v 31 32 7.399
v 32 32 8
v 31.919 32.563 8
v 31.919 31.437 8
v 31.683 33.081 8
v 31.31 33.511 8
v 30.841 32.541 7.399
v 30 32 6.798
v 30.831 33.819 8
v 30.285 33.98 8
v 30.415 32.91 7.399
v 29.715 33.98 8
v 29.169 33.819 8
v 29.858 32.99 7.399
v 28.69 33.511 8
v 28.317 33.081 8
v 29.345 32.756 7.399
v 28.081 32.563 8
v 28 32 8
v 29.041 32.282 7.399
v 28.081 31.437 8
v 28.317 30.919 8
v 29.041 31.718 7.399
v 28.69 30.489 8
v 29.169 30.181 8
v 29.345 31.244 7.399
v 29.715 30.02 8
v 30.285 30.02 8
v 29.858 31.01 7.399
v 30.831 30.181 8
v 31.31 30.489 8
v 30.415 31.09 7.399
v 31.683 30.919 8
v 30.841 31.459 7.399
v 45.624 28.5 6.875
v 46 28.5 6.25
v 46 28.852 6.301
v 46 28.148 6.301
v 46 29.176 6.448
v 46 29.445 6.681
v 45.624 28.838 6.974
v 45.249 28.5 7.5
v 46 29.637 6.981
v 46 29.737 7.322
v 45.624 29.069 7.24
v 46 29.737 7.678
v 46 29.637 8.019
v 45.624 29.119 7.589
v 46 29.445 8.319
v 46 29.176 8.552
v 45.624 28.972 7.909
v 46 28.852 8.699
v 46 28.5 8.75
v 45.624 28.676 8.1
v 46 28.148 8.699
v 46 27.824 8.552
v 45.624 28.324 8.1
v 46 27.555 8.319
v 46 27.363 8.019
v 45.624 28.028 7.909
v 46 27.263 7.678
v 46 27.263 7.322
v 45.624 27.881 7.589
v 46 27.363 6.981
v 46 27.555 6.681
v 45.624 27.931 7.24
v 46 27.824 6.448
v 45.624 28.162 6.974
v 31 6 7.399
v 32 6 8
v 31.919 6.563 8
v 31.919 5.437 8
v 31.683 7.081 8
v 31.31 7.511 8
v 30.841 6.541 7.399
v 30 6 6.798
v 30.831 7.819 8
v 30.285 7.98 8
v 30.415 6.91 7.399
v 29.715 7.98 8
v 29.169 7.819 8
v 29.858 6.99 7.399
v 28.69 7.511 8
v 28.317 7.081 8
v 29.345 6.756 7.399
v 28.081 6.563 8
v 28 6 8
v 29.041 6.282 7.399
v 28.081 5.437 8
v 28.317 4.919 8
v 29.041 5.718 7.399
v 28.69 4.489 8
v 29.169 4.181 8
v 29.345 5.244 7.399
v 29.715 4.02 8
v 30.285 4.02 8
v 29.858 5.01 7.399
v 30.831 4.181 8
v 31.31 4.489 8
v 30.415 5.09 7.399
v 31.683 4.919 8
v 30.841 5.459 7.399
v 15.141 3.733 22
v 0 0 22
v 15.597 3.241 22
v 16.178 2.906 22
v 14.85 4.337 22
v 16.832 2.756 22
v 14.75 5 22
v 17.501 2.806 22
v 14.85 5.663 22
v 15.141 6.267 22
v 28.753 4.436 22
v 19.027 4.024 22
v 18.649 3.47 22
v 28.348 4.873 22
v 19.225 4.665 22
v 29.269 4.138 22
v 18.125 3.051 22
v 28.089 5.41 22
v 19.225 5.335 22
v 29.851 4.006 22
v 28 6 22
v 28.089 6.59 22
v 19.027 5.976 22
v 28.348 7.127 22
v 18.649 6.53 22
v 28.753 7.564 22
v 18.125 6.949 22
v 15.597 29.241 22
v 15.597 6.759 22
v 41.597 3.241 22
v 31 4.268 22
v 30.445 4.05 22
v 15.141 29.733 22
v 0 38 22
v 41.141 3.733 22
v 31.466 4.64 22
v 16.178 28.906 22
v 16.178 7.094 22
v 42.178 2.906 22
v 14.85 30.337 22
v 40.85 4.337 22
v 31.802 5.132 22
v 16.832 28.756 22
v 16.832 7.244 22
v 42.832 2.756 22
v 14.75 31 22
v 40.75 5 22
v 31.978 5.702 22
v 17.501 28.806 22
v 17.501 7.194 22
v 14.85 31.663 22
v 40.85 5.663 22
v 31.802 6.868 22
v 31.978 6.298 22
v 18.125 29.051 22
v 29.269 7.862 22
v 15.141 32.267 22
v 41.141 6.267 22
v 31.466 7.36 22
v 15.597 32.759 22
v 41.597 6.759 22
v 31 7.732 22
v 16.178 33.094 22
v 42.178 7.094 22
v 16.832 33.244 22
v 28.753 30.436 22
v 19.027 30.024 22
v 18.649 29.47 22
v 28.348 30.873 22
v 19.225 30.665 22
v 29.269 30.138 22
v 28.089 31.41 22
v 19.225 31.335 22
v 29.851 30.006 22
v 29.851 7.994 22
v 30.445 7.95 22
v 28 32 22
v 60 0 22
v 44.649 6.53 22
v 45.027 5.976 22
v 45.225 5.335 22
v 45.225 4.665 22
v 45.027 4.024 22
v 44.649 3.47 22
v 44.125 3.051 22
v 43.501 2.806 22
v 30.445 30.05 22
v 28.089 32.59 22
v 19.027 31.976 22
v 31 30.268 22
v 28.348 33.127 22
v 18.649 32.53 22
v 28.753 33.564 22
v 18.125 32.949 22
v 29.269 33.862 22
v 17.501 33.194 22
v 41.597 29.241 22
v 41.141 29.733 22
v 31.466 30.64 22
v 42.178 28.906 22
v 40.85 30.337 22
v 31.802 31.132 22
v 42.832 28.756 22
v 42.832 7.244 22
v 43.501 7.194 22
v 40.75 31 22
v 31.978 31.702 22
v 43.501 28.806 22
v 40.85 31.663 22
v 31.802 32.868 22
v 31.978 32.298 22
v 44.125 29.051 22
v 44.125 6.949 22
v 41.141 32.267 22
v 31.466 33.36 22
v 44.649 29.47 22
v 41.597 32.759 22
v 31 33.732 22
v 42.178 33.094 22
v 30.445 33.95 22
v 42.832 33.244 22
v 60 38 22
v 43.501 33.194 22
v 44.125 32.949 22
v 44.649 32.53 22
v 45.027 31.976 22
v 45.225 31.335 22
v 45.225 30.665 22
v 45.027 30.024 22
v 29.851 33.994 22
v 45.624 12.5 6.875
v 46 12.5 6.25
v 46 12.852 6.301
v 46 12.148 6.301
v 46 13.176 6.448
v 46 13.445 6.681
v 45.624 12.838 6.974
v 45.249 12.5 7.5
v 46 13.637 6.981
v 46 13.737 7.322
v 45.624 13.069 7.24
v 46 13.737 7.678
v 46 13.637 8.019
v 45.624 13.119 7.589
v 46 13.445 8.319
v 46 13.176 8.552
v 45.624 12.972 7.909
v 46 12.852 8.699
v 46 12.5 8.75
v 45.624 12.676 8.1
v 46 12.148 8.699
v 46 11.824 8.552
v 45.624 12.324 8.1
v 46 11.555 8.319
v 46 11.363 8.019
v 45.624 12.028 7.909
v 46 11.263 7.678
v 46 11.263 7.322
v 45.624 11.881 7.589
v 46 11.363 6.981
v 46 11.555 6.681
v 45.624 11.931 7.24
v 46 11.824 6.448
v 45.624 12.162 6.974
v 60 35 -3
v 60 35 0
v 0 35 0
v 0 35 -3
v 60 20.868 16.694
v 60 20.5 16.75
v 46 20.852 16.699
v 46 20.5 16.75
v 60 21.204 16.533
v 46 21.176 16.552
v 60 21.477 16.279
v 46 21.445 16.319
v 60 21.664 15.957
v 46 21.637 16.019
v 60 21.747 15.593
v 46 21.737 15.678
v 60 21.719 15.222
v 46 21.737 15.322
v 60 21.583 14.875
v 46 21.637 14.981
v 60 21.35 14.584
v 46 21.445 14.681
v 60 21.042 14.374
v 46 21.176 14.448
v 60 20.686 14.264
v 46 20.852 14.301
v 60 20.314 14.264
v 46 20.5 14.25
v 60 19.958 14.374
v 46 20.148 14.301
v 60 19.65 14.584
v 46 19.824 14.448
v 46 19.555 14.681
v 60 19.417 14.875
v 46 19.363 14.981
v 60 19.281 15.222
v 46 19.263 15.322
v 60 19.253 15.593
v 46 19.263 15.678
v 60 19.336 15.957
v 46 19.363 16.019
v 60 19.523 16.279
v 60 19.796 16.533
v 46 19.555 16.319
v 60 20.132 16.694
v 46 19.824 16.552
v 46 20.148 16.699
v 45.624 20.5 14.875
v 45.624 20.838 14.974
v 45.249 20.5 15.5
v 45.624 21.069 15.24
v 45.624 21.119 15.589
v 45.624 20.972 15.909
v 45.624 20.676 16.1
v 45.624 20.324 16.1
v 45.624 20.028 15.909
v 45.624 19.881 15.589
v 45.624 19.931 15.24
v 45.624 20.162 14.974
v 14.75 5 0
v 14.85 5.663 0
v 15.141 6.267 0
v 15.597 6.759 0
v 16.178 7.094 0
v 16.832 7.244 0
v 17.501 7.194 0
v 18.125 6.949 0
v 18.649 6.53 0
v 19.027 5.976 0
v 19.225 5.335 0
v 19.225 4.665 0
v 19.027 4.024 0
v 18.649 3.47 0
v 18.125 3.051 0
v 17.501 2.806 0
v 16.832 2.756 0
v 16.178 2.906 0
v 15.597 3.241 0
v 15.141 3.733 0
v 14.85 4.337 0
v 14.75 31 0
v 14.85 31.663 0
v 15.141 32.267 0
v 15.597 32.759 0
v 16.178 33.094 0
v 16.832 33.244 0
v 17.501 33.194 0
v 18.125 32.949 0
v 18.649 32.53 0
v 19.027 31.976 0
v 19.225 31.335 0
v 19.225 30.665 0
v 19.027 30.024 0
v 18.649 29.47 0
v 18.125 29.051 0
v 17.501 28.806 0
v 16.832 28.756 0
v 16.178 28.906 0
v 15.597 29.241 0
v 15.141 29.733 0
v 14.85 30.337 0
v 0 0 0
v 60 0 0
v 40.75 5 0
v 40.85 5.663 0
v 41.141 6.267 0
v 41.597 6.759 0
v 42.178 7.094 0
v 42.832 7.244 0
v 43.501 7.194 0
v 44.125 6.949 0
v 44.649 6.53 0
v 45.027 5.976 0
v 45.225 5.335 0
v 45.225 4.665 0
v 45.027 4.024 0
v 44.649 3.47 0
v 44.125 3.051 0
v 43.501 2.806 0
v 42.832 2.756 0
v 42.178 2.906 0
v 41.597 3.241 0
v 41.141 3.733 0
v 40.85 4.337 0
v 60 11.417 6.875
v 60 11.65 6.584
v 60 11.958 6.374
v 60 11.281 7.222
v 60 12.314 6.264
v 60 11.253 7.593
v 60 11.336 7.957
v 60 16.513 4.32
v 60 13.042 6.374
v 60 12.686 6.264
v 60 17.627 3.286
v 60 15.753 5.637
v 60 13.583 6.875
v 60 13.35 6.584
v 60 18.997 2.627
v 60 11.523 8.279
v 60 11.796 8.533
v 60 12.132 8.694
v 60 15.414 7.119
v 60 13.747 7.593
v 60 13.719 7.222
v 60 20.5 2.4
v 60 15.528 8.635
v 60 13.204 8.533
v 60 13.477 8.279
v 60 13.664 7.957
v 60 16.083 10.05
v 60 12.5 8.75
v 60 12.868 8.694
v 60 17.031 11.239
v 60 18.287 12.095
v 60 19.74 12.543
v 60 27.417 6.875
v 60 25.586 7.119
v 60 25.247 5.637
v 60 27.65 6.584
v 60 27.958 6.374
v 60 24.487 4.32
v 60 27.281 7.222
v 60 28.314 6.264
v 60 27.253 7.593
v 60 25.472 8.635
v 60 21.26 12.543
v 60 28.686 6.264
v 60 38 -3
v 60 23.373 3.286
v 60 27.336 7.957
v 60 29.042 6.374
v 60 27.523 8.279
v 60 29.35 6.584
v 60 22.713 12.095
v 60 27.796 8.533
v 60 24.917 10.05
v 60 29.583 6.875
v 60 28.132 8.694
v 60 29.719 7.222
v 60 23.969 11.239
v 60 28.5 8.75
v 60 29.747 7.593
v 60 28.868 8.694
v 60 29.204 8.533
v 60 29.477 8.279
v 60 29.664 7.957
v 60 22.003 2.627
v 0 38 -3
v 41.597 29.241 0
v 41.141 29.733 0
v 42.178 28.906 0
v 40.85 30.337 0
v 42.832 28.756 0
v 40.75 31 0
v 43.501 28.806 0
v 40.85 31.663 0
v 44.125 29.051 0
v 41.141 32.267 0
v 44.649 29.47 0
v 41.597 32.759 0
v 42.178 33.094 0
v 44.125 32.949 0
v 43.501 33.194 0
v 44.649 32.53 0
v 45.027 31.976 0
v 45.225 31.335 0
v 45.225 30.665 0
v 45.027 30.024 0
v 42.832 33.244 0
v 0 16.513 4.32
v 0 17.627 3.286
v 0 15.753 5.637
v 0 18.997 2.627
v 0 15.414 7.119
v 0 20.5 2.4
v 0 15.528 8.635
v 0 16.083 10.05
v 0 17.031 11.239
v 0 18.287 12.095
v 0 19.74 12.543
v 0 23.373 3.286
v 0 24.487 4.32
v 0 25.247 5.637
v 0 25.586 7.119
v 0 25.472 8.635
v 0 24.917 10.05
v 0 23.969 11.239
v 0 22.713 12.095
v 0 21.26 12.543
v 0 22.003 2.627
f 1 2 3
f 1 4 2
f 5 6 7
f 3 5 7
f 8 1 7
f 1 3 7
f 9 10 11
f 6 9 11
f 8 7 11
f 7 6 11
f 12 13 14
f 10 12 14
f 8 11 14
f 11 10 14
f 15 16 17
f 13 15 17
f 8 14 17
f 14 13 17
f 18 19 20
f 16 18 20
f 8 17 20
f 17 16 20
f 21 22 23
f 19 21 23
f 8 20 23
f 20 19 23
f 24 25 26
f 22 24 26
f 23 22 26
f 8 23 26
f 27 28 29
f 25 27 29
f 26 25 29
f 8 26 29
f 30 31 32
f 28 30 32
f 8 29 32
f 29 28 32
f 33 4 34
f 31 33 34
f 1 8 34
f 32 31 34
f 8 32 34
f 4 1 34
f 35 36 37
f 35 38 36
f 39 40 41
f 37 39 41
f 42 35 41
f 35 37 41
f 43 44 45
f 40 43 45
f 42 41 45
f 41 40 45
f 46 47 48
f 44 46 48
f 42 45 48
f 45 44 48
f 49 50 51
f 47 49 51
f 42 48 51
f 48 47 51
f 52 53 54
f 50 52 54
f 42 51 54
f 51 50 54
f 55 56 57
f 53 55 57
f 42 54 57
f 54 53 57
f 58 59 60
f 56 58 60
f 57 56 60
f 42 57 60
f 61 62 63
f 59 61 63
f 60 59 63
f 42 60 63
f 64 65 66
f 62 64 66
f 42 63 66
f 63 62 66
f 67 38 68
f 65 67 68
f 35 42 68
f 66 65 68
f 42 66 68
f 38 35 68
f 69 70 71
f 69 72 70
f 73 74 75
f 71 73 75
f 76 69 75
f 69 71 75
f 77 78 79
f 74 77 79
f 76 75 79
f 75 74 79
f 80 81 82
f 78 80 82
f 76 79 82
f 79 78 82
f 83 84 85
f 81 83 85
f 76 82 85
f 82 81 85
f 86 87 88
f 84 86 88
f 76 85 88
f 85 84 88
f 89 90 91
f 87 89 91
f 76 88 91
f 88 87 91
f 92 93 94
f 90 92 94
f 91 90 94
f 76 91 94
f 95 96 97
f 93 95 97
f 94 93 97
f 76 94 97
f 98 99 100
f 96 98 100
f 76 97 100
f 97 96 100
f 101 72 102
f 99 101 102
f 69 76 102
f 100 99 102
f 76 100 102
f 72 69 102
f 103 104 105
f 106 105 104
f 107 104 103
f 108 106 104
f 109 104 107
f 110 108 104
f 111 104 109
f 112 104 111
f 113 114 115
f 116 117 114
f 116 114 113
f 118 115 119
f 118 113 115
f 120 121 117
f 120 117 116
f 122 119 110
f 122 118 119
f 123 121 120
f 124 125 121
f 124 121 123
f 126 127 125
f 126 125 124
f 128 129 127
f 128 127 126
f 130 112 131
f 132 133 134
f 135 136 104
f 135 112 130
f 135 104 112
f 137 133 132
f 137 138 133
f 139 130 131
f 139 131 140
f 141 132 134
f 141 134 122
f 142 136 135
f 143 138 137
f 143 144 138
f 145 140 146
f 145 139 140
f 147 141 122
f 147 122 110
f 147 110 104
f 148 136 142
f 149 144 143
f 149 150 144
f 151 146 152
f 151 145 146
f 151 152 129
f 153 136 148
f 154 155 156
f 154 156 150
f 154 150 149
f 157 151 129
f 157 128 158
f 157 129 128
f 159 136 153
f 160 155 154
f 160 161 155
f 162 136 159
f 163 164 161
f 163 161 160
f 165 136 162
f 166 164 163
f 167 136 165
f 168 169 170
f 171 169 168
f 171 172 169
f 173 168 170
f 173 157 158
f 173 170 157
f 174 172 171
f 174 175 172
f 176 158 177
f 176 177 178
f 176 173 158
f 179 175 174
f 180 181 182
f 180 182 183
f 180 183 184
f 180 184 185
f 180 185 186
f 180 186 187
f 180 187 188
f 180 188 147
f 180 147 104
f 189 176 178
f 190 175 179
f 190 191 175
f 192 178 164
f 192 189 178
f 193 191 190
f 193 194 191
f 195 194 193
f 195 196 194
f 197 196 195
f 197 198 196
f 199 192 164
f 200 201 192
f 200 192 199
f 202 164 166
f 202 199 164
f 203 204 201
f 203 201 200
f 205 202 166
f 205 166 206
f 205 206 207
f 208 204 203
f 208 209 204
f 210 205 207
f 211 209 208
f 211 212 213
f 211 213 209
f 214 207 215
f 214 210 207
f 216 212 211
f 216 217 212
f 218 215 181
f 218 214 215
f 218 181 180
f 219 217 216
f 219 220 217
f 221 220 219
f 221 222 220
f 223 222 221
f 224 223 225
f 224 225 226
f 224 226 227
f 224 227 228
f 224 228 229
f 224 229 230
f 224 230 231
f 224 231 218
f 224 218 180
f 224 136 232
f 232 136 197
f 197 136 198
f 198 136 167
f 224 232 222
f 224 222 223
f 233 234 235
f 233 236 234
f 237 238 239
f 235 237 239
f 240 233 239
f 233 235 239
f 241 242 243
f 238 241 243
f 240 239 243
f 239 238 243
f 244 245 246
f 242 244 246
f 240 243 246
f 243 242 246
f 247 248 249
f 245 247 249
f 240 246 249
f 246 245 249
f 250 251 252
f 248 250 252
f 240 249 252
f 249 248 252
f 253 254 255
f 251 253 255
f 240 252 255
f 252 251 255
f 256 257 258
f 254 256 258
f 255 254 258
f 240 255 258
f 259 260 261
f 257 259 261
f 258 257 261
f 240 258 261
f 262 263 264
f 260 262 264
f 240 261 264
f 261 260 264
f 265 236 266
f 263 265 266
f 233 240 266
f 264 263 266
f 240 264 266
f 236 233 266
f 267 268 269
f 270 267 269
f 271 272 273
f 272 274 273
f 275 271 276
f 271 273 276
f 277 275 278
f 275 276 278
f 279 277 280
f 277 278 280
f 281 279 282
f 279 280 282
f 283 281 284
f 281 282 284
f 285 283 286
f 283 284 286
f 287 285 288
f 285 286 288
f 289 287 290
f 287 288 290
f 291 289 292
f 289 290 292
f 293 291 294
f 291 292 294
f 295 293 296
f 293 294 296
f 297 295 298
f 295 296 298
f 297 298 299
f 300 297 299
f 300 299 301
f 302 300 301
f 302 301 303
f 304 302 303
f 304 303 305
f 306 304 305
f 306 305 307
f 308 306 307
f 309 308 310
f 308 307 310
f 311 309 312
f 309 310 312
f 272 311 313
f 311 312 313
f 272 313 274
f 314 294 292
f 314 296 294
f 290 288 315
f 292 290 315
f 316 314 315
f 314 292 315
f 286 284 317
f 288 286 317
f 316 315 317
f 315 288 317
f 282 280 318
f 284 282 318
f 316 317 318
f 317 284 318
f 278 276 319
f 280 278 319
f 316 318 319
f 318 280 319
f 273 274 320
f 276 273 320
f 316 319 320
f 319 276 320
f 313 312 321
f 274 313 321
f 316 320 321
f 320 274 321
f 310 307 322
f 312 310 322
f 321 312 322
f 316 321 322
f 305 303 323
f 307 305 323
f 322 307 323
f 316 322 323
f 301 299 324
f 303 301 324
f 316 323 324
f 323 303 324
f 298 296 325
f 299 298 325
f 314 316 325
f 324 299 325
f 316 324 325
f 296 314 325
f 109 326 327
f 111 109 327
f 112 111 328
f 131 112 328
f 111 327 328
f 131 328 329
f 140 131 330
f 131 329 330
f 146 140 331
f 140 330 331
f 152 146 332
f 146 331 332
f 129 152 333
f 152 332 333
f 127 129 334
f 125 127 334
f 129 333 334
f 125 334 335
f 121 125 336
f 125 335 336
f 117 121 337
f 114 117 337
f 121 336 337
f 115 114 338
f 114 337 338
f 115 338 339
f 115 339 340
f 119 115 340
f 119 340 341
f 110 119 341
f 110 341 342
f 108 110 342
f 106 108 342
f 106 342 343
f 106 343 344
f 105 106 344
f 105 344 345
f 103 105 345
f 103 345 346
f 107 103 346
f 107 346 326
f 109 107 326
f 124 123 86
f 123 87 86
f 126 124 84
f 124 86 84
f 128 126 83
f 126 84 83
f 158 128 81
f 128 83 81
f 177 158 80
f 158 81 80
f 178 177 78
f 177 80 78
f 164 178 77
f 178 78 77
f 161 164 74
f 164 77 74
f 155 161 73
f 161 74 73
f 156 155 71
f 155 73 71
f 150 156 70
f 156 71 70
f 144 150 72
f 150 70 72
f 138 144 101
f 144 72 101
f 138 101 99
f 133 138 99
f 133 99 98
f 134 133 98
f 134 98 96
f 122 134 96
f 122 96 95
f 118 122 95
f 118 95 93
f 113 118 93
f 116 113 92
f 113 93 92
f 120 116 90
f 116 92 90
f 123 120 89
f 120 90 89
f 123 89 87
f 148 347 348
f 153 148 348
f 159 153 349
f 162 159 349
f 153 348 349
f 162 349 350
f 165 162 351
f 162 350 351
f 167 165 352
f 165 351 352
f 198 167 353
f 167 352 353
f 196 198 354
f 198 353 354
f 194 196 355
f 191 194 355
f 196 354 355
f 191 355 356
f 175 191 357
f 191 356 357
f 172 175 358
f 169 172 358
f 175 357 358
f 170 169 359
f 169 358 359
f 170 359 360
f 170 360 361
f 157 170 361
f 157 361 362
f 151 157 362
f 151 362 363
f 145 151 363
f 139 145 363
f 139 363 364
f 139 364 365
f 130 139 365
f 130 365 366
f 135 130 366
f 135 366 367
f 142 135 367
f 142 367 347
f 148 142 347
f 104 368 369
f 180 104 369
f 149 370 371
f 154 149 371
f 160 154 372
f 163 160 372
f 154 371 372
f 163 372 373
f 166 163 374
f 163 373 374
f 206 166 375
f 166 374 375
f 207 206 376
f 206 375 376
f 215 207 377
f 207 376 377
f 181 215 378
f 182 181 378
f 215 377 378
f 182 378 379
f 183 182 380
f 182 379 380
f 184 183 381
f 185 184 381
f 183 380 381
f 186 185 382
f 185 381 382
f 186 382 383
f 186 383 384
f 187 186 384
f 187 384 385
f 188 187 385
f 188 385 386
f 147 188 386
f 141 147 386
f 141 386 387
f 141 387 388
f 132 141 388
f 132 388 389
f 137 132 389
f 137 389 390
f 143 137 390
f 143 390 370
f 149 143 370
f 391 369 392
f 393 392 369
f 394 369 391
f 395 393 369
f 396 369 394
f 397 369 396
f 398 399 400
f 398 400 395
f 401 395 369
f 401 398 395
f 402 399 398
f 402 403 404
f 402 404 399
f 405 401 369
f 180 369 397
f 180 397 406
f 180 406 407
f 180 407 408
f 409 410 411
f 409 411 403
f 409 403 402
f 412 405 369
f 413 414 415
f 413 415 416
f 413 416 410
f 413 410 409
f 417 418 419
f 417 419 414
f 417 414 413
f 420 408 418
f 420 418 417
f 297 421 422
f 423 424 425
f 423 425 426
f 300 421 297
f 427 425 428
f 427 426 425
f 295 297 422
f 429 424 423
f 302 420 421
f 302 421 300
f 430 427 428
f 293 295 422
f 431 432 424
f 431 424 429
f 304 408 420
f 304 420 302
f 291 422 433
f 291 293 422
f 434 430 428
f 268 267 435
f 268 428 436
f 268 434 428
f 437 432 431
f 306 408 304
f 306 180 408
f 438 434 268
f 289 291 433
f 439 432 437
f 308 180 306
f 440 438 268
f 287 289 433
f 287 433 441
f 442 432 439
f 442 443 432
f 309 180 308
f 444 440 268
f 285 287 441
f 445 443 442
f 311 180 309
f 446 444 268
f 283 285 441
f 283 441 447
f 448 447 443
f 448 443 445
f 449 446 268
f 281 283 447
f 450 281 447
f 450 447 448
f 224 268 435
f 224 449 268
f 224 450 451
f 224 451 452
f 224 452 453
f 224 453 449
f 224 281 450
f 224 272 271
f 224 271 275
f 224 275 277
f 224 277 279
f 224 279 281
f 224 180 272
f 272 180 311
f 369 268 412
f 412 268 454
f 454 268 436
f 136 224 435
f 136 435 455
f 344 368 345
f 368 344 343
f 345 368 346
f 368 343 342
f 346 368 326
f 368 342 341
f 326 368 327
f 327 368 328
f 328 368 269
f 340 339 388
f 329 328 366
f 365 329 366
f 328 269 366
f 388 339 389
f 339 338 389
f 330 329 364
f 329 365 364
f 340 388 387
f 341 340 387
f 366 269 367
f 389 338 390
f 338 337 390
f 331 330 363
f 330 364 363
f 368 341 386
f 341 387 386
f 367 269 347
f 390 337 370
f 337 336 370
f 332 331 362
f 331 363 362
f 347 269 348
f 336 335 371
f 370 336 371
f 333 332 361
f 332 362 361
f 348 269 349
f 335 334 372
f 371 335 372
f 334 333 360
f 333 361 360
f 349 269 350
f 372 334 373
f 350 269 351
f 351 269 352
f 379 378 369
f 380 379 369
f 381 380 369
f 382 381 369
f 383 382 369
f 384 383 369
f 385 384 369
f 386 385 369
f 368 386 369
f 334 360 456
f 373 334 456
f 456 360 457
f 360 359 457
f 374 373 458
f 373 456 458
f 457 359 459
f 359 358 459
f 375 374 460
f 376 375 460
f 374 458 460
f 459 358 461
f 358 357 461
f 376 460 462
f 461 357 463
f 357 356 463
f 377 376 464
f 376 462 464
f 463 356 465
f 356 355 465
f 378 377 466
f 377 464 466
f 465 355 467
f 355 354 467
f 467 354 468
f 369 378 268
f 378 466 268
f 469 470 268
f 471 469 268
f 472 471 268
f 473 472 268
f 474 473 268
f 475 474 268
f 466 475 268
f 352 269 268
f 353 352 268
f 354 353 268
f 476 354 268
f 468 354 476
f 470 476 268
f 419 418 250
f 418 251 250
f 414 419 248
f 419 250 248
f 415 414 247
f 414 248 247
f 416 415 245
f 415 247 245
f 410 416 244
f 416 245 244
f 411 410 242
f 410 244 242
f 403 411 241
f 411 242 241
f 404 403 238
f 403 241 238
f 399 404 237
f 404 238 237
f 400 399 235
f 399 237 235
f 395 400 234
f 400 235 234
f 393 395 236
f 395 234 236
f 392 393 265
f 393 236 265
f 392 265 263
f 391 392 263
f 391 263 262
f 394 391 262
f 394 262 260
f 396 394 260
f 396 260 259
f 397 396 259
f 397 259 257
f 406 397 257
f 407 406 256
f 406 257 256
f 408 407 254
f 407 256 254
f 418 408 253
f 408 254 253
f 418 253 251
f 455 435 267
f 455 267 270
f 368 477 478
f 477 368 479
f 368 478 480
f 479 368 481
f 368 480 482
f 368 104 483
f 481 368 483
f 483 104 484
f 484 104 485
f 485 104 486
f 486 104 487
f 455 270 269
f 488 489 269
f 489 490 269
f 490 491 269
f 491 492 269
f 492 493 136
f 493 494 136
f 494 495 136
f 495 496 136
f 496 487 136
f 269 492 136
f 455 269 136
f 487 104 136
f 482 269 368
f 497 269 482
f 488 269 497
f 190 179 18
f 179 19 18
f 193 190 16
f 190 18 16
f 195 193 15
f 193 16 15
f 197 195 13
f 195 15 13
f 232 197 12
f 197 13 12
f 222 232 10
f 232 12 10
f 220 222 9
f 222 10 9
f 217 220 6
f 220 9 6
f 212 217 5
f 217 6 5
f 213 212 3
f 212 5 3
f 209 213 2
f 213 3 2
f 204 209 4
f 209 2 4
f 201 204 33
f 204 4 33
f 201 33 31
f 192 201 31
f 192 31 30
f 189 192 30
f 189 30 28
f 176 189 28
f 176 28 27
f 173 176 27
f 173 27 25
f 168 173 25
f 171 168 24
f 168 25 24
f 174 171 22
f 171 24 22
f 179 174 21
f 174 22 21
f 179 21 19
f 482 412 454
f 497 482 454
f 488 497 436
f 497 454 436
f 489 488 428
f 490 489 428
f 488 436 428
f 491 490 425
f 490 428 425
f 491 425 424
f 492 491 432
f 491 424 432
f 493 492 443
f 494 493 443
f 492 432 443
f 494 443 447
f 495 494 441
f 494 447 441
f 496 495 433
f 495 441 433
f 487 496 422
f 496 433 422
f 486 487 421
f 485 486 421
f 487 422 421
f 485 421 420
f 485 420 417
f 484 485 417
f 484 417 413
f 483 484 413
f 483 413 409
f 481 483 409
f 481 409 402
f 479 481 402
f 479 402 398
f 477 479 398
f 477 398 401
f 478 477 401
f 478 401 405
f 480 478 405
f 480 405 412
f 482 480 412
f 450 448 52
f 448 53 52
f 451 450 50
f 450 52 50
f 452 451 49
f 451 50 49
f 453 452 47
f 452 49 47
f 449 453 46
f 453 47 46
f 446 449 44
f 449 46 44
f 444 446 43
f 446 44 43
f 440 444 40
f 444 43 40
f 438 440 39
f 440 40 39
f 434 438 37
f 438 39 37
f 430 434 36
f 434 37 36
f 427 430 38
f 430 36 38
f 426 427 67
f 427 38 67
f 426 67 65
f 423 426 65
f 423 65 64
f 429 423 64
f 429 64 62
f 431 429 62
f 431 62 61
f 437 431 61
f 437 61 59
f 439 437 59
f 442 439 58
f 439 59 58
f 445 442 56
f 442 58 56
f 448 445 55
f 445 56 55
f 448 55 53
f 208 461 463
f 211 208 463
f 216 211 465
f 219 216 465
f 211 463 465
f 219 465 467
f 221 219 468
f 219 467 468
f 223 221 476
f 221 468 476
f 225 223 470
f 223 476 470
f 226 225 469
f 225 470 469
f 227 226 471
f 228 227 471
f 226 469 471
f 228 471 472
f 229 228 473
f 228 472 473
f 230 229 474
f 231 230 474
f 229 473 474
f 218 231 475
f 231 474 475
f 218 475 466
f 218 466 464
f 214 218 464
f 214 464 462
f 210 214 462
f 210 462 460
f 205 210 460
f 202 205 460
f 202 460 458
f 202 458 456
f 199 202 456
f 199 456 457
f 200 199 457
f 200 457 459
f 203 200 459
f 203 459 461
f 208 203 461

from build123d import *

# Parameters (mm, degrees)
CROQUIS1_W                         = 60
CROQUIS1_H                         = 38
SALIENTE_EXTRUIR1_DEPTH            = 22
CROQUIS2_R                         = 5.1
CORTAR_EXTRUIR1_DEPTH              = 61
TALADROS_DE_ESPIGA_DE_4_0MM2_D     = 4
TALADROS_DE_ESPIGA_DE_4_0MM2_DEPTH = 14
TALADROS_DE_ESPIGA_DE_4_0MM2_TIP   = 1.201721238
CROQUIS6_W                         = 60
CROQUIS6_H                         = 3
SALIENTE_EXTRUIR2_DEPTH            = 3
TALADRO_ROSCADO_M31_D              = 2.5
TALADRO_ROSCADO_M31_DEPTH          = 14
TALADRO_ROSCADO_M31_TIP            = 0.751075774
TALADRO_DE_MARGEN_PARA_M41_D       = 4.5


with BuildPart() as part:
    # Croquis1 → Saliente-Extruir1 (new body)
    with BuildSketch(Plane.XY):
        with Locations((30, 19)):
            Rectangle(CROQUIS1_W, CROQUIS1_H)
    extrude(amount=SALIENTE_EXTRUIR1_DEPTH)

    # Croquis2 → Cortar-Extruir1 (cut, through all)
    with BuildSketch(Plane(origin=(60, 0, 0), x_dir=(0, 0, -1), z_dir=(1, 0, 0))):
        with Locations((-7.5, 20.5)):
            Circle(CROQUIS2_R)
    extrude(amount=-CORTAR_EXTRUIR1_DEPTH, mode=Mode.SUBTRACT)

    # Taladros de espiga de Ø4.0mm2
    with Locations(Plane.XY.offset(22)):
        with Locations((30, 6), (30, 32)):
            Hole(TALADROS_DE_ESPIGA_DE_4_0MM2_D / 2, depth=TALADROS_DE_ESPIGA_DE_4_0MM2_DEPTH)
            with Locations((0, 0, -(TALADROS_DE_ESPIGA_DE_4_0MM2_DEPTH + TALADROS_DE_ESPIGA_DE_4_0MM2_TIP / 2))):  # 118° drill point
                Cone(0, TALADROS_DE_ESPIGA_DE_4_0MM2_D / 2, TALADROS_DE_ESPIGA_DE_4_0MM2_TIP, mode=Mode.SUBTRACT)

    # Croquis6 → Saliente-Extruir2 (add)
    with BuildSketch(Plane(origin=(0, 0, 0), x_dir=(-1, 0, 0), z_dir=(0, 0, -1))):
        with Locations((-30, 36.5)):
            Rectangle(CROQUIS6_W, CROQUIS6_H)
    extrude(amount=SALIENTE_EXTRUIR2_DEPTH)

    # Taladro roscado M31
    with Locations(Plane(origin=(60, 0, 0), x_dir=(0, 0, -1), z_dir=(1, 0, 0))):
        with Locations((-15.5, 20.5), (-7.5, 12.5), (-7.5, 28.5)):
            Hole(TALADRO_ROSCADO_M31_D / 2, depth=TALADRO_ROSCADO_M31_DEPTH)
            with Locations((0, 0, -(TALADRO_ROSCADO_M31_DEPTH + TALADRO_ROSCADO_M31_TIP / 2))):  # 118° drill point
                Cone(0, TALADRO_ROSCADO_M31_D / 2, TALADRO_ROSCADO_M31_TIP, mode=Mode.SUBTRACT)

    # Taladro de margen para M41 (through all)
    with Locations(Plane.XY.offset(22)):
        with Locations((43, 5), (43, 31), (17, 5), (17, 31)):
            Hole(TALADRO_DE_MARGEN_PARA_M41_D / 2)


solid = part.part
